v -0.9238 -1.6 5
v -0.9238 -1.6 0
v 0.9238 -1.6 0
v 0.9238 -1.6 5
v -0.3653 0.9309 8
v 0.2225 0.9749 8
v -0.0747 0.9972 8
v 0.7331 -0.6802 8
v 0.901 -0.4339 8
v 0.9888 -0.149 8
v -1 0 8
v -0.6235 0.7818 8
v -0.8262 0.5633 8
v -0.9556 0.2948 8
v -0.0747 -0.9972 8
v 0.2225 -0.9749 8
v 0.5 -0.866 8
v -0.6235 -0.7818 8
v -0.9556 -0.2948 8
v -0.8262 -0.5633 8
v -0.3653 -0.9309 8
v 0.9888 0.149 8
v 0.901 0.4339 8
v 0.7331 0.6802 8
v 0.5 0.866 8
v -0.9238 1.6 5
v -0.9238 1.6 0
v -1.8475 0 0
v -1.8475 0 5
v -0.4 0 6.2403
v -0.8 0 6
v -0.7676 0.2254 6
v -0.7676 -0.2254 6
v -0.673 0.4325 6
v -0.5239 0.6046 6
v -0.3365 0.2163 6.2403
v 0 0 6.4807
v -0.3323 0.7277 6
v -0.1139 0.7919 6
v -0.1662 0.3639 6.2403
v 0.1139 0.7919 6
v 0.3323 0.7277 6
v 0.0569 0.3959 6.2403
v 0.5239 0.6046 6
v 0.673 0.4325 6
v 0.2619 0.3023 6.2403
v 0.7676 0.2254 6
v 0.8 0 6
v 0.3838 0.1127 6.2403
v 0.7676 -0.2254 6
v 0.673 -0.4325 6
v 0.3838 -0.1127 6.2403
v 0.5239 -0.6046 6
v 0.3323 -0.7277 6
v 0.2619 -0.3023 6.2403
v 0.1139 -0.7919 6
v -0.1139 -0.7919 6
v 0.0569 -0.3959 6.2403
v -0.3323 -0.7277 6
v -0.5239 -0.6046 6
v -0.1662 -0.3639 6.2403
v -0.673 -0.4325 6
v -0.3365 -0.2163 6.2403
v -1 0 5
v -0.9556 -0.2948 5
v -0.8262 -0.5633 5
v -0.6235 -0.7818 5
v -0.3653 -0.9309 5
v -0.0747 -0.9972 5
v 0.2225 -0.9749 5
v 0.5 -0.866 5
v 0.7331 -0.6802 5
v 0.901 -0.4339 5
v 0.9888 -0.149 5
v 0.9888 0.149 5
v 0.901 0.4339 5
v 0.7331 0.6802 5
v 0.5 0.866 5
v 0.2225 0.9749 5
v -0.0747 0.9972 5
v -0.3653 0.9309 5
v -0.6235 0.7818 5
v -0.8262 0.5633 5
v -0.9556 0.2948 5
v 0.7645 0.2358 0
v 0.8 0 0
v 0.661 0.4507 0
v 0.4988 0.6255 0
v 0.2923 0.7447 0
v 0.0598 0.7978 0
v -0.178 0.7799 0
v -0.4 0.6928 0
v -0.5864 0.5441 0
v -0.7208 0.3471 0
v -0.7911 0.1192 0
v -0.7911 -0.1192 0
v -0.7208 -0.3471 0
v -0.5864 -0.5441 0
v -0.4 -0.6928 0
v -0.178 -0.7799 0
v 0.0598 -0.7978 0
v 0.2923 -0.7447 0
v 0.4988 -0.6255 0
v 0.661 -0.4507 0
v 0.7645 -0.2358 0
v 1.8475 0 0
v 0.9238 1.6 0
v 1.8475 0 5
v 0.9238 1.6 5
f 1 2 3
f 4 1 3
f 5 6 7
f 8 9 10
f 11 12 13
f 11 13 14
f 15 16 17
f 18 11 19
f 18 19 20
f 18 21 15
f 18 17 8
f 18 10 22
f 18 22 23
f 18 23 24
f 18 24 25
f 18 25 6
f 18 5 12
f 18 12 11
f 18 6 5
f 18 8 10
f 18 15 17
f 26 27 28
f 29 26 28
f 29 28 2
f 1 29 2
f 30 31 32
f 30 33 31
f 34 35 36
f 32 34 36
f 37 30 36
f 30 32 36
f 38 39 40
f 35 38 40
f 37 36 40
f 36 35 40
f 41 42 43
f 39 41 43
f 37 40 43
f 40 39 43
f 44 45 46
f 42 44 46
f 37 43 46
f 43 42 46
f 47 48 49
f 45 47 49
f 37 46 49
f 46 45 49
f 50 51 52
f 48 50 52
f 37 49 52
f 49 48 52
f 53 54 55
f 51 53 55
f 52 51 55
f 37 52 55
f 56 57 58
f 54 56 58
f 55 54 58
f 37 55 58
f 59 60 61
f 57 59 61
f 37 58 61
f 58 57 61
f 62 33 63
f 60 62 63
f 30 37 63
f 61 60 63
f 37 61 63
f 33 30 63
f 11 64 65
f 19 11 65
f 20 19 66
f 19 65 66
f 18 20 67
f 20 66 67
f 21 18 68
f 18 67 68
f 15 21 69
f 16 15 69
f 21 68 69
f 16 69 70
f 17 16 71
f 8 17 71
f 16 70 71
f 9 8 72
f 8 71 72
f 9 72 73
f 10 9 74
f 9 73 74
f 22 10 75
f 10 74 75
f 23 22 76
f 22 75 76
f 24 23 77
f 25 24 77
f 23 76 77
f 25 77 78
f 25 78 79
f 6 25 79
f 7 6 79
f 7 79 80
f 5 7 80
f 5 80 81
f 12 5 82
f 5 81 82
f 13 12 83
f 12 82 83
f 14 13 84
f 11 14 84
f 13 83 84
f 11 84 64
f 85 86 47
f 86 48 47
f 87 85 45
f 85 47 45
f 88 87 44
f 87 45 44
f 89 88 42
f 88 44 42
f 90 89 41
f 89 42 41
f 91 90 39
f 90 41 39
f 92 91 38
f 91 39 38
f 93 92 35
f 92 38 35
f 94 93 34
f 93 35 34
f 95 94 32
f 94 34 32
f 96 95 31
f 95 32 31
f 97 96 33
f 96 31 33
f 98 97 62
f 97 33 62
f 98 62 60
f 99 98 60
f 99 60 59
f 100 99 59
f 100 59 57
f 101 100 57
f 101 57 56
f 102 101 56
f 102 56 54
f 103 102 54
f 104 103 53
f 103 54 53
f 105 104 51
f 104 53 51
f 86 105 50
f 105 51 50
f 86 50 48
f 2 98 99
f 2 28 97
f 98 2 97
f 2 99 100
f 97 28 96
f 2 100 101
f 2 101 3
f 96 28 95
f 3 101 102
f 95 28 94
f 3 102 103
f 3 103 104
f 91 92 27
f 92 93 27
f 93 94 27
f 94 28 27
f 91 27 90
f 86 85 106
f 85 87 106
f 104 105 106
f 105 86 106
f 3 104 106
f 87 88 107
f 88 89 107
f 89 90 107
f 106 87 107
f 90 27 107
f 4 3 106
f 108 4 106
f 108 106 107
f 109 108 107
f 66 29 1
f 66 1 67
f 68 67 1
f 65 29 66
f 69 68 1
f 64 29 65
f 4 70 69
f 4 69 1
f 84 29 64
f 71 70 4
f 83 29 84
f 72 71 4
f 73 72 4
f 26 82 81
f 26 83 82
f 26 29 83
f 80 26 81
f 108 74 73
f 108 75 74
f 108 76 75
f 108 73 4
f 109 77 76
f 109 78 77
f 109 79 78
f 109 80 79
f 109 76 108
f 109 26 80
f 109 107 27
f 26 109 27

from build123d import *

# Parameters (mm, degrees)
EXTRUDE_1_DEPTH        = 5
SKETCH_2_R             = 1
EXTRUDE_2_DEPTH        = 3
HOLE_WIZARD_M2_1_D     = 1.6
HOLE_WIZARD_M2_1_DEPTH = 6
HOLE_WIZARD_M2_1_TIP   = 0.480688495


with BuildPart() as part:
    # 草图1 → 拉伸1 (new body)
    with BuildSketch(Plane.XY):
        Polygon((0.923760431, -1.6), (1.847520861, 0), (0.923760431, 1.6), (-0.923760431, 1.6), (-1.847520861, 0), (-0.923760431, -1.6), align=None)
    extrude(amount=EXTRUDE_1_DEPTH)

    # 草图2 → 拉伸2 (add)
    with BuildSketch(Plane.XY.offset(5)):
        with Locations(Location((0, 0, 0), (0, 0, 180))):
            Circle(SKETCH_2_R)
    extrude(amount=EXTRUDE_2_DEPTH)

    # M2 螺纹孔1
    with Locations(Plane(origin=(0, 0, 0), x_dir=(-1, 0, 0), z_dir=(0, 0, -1))):
        with Locations((0, 0)):
            Hole(HOLE_WIZARD_M2_1_D / 2, depth=HOLE_WIZARD_M2_1_DEPTH)
            with Locations((0, 0, -(HOLE_WIZARD_M2_1_DEPTH + HOLE_WIZARD_M2_1_TIP / 2))):  # 118° drill point
                Cone(0, HOLE_WIZARD_M2_1_D / 2, HOLE_WIZARD_M2_1_TIP, mode=Mode.SUBTRACT)


solid = part.part
